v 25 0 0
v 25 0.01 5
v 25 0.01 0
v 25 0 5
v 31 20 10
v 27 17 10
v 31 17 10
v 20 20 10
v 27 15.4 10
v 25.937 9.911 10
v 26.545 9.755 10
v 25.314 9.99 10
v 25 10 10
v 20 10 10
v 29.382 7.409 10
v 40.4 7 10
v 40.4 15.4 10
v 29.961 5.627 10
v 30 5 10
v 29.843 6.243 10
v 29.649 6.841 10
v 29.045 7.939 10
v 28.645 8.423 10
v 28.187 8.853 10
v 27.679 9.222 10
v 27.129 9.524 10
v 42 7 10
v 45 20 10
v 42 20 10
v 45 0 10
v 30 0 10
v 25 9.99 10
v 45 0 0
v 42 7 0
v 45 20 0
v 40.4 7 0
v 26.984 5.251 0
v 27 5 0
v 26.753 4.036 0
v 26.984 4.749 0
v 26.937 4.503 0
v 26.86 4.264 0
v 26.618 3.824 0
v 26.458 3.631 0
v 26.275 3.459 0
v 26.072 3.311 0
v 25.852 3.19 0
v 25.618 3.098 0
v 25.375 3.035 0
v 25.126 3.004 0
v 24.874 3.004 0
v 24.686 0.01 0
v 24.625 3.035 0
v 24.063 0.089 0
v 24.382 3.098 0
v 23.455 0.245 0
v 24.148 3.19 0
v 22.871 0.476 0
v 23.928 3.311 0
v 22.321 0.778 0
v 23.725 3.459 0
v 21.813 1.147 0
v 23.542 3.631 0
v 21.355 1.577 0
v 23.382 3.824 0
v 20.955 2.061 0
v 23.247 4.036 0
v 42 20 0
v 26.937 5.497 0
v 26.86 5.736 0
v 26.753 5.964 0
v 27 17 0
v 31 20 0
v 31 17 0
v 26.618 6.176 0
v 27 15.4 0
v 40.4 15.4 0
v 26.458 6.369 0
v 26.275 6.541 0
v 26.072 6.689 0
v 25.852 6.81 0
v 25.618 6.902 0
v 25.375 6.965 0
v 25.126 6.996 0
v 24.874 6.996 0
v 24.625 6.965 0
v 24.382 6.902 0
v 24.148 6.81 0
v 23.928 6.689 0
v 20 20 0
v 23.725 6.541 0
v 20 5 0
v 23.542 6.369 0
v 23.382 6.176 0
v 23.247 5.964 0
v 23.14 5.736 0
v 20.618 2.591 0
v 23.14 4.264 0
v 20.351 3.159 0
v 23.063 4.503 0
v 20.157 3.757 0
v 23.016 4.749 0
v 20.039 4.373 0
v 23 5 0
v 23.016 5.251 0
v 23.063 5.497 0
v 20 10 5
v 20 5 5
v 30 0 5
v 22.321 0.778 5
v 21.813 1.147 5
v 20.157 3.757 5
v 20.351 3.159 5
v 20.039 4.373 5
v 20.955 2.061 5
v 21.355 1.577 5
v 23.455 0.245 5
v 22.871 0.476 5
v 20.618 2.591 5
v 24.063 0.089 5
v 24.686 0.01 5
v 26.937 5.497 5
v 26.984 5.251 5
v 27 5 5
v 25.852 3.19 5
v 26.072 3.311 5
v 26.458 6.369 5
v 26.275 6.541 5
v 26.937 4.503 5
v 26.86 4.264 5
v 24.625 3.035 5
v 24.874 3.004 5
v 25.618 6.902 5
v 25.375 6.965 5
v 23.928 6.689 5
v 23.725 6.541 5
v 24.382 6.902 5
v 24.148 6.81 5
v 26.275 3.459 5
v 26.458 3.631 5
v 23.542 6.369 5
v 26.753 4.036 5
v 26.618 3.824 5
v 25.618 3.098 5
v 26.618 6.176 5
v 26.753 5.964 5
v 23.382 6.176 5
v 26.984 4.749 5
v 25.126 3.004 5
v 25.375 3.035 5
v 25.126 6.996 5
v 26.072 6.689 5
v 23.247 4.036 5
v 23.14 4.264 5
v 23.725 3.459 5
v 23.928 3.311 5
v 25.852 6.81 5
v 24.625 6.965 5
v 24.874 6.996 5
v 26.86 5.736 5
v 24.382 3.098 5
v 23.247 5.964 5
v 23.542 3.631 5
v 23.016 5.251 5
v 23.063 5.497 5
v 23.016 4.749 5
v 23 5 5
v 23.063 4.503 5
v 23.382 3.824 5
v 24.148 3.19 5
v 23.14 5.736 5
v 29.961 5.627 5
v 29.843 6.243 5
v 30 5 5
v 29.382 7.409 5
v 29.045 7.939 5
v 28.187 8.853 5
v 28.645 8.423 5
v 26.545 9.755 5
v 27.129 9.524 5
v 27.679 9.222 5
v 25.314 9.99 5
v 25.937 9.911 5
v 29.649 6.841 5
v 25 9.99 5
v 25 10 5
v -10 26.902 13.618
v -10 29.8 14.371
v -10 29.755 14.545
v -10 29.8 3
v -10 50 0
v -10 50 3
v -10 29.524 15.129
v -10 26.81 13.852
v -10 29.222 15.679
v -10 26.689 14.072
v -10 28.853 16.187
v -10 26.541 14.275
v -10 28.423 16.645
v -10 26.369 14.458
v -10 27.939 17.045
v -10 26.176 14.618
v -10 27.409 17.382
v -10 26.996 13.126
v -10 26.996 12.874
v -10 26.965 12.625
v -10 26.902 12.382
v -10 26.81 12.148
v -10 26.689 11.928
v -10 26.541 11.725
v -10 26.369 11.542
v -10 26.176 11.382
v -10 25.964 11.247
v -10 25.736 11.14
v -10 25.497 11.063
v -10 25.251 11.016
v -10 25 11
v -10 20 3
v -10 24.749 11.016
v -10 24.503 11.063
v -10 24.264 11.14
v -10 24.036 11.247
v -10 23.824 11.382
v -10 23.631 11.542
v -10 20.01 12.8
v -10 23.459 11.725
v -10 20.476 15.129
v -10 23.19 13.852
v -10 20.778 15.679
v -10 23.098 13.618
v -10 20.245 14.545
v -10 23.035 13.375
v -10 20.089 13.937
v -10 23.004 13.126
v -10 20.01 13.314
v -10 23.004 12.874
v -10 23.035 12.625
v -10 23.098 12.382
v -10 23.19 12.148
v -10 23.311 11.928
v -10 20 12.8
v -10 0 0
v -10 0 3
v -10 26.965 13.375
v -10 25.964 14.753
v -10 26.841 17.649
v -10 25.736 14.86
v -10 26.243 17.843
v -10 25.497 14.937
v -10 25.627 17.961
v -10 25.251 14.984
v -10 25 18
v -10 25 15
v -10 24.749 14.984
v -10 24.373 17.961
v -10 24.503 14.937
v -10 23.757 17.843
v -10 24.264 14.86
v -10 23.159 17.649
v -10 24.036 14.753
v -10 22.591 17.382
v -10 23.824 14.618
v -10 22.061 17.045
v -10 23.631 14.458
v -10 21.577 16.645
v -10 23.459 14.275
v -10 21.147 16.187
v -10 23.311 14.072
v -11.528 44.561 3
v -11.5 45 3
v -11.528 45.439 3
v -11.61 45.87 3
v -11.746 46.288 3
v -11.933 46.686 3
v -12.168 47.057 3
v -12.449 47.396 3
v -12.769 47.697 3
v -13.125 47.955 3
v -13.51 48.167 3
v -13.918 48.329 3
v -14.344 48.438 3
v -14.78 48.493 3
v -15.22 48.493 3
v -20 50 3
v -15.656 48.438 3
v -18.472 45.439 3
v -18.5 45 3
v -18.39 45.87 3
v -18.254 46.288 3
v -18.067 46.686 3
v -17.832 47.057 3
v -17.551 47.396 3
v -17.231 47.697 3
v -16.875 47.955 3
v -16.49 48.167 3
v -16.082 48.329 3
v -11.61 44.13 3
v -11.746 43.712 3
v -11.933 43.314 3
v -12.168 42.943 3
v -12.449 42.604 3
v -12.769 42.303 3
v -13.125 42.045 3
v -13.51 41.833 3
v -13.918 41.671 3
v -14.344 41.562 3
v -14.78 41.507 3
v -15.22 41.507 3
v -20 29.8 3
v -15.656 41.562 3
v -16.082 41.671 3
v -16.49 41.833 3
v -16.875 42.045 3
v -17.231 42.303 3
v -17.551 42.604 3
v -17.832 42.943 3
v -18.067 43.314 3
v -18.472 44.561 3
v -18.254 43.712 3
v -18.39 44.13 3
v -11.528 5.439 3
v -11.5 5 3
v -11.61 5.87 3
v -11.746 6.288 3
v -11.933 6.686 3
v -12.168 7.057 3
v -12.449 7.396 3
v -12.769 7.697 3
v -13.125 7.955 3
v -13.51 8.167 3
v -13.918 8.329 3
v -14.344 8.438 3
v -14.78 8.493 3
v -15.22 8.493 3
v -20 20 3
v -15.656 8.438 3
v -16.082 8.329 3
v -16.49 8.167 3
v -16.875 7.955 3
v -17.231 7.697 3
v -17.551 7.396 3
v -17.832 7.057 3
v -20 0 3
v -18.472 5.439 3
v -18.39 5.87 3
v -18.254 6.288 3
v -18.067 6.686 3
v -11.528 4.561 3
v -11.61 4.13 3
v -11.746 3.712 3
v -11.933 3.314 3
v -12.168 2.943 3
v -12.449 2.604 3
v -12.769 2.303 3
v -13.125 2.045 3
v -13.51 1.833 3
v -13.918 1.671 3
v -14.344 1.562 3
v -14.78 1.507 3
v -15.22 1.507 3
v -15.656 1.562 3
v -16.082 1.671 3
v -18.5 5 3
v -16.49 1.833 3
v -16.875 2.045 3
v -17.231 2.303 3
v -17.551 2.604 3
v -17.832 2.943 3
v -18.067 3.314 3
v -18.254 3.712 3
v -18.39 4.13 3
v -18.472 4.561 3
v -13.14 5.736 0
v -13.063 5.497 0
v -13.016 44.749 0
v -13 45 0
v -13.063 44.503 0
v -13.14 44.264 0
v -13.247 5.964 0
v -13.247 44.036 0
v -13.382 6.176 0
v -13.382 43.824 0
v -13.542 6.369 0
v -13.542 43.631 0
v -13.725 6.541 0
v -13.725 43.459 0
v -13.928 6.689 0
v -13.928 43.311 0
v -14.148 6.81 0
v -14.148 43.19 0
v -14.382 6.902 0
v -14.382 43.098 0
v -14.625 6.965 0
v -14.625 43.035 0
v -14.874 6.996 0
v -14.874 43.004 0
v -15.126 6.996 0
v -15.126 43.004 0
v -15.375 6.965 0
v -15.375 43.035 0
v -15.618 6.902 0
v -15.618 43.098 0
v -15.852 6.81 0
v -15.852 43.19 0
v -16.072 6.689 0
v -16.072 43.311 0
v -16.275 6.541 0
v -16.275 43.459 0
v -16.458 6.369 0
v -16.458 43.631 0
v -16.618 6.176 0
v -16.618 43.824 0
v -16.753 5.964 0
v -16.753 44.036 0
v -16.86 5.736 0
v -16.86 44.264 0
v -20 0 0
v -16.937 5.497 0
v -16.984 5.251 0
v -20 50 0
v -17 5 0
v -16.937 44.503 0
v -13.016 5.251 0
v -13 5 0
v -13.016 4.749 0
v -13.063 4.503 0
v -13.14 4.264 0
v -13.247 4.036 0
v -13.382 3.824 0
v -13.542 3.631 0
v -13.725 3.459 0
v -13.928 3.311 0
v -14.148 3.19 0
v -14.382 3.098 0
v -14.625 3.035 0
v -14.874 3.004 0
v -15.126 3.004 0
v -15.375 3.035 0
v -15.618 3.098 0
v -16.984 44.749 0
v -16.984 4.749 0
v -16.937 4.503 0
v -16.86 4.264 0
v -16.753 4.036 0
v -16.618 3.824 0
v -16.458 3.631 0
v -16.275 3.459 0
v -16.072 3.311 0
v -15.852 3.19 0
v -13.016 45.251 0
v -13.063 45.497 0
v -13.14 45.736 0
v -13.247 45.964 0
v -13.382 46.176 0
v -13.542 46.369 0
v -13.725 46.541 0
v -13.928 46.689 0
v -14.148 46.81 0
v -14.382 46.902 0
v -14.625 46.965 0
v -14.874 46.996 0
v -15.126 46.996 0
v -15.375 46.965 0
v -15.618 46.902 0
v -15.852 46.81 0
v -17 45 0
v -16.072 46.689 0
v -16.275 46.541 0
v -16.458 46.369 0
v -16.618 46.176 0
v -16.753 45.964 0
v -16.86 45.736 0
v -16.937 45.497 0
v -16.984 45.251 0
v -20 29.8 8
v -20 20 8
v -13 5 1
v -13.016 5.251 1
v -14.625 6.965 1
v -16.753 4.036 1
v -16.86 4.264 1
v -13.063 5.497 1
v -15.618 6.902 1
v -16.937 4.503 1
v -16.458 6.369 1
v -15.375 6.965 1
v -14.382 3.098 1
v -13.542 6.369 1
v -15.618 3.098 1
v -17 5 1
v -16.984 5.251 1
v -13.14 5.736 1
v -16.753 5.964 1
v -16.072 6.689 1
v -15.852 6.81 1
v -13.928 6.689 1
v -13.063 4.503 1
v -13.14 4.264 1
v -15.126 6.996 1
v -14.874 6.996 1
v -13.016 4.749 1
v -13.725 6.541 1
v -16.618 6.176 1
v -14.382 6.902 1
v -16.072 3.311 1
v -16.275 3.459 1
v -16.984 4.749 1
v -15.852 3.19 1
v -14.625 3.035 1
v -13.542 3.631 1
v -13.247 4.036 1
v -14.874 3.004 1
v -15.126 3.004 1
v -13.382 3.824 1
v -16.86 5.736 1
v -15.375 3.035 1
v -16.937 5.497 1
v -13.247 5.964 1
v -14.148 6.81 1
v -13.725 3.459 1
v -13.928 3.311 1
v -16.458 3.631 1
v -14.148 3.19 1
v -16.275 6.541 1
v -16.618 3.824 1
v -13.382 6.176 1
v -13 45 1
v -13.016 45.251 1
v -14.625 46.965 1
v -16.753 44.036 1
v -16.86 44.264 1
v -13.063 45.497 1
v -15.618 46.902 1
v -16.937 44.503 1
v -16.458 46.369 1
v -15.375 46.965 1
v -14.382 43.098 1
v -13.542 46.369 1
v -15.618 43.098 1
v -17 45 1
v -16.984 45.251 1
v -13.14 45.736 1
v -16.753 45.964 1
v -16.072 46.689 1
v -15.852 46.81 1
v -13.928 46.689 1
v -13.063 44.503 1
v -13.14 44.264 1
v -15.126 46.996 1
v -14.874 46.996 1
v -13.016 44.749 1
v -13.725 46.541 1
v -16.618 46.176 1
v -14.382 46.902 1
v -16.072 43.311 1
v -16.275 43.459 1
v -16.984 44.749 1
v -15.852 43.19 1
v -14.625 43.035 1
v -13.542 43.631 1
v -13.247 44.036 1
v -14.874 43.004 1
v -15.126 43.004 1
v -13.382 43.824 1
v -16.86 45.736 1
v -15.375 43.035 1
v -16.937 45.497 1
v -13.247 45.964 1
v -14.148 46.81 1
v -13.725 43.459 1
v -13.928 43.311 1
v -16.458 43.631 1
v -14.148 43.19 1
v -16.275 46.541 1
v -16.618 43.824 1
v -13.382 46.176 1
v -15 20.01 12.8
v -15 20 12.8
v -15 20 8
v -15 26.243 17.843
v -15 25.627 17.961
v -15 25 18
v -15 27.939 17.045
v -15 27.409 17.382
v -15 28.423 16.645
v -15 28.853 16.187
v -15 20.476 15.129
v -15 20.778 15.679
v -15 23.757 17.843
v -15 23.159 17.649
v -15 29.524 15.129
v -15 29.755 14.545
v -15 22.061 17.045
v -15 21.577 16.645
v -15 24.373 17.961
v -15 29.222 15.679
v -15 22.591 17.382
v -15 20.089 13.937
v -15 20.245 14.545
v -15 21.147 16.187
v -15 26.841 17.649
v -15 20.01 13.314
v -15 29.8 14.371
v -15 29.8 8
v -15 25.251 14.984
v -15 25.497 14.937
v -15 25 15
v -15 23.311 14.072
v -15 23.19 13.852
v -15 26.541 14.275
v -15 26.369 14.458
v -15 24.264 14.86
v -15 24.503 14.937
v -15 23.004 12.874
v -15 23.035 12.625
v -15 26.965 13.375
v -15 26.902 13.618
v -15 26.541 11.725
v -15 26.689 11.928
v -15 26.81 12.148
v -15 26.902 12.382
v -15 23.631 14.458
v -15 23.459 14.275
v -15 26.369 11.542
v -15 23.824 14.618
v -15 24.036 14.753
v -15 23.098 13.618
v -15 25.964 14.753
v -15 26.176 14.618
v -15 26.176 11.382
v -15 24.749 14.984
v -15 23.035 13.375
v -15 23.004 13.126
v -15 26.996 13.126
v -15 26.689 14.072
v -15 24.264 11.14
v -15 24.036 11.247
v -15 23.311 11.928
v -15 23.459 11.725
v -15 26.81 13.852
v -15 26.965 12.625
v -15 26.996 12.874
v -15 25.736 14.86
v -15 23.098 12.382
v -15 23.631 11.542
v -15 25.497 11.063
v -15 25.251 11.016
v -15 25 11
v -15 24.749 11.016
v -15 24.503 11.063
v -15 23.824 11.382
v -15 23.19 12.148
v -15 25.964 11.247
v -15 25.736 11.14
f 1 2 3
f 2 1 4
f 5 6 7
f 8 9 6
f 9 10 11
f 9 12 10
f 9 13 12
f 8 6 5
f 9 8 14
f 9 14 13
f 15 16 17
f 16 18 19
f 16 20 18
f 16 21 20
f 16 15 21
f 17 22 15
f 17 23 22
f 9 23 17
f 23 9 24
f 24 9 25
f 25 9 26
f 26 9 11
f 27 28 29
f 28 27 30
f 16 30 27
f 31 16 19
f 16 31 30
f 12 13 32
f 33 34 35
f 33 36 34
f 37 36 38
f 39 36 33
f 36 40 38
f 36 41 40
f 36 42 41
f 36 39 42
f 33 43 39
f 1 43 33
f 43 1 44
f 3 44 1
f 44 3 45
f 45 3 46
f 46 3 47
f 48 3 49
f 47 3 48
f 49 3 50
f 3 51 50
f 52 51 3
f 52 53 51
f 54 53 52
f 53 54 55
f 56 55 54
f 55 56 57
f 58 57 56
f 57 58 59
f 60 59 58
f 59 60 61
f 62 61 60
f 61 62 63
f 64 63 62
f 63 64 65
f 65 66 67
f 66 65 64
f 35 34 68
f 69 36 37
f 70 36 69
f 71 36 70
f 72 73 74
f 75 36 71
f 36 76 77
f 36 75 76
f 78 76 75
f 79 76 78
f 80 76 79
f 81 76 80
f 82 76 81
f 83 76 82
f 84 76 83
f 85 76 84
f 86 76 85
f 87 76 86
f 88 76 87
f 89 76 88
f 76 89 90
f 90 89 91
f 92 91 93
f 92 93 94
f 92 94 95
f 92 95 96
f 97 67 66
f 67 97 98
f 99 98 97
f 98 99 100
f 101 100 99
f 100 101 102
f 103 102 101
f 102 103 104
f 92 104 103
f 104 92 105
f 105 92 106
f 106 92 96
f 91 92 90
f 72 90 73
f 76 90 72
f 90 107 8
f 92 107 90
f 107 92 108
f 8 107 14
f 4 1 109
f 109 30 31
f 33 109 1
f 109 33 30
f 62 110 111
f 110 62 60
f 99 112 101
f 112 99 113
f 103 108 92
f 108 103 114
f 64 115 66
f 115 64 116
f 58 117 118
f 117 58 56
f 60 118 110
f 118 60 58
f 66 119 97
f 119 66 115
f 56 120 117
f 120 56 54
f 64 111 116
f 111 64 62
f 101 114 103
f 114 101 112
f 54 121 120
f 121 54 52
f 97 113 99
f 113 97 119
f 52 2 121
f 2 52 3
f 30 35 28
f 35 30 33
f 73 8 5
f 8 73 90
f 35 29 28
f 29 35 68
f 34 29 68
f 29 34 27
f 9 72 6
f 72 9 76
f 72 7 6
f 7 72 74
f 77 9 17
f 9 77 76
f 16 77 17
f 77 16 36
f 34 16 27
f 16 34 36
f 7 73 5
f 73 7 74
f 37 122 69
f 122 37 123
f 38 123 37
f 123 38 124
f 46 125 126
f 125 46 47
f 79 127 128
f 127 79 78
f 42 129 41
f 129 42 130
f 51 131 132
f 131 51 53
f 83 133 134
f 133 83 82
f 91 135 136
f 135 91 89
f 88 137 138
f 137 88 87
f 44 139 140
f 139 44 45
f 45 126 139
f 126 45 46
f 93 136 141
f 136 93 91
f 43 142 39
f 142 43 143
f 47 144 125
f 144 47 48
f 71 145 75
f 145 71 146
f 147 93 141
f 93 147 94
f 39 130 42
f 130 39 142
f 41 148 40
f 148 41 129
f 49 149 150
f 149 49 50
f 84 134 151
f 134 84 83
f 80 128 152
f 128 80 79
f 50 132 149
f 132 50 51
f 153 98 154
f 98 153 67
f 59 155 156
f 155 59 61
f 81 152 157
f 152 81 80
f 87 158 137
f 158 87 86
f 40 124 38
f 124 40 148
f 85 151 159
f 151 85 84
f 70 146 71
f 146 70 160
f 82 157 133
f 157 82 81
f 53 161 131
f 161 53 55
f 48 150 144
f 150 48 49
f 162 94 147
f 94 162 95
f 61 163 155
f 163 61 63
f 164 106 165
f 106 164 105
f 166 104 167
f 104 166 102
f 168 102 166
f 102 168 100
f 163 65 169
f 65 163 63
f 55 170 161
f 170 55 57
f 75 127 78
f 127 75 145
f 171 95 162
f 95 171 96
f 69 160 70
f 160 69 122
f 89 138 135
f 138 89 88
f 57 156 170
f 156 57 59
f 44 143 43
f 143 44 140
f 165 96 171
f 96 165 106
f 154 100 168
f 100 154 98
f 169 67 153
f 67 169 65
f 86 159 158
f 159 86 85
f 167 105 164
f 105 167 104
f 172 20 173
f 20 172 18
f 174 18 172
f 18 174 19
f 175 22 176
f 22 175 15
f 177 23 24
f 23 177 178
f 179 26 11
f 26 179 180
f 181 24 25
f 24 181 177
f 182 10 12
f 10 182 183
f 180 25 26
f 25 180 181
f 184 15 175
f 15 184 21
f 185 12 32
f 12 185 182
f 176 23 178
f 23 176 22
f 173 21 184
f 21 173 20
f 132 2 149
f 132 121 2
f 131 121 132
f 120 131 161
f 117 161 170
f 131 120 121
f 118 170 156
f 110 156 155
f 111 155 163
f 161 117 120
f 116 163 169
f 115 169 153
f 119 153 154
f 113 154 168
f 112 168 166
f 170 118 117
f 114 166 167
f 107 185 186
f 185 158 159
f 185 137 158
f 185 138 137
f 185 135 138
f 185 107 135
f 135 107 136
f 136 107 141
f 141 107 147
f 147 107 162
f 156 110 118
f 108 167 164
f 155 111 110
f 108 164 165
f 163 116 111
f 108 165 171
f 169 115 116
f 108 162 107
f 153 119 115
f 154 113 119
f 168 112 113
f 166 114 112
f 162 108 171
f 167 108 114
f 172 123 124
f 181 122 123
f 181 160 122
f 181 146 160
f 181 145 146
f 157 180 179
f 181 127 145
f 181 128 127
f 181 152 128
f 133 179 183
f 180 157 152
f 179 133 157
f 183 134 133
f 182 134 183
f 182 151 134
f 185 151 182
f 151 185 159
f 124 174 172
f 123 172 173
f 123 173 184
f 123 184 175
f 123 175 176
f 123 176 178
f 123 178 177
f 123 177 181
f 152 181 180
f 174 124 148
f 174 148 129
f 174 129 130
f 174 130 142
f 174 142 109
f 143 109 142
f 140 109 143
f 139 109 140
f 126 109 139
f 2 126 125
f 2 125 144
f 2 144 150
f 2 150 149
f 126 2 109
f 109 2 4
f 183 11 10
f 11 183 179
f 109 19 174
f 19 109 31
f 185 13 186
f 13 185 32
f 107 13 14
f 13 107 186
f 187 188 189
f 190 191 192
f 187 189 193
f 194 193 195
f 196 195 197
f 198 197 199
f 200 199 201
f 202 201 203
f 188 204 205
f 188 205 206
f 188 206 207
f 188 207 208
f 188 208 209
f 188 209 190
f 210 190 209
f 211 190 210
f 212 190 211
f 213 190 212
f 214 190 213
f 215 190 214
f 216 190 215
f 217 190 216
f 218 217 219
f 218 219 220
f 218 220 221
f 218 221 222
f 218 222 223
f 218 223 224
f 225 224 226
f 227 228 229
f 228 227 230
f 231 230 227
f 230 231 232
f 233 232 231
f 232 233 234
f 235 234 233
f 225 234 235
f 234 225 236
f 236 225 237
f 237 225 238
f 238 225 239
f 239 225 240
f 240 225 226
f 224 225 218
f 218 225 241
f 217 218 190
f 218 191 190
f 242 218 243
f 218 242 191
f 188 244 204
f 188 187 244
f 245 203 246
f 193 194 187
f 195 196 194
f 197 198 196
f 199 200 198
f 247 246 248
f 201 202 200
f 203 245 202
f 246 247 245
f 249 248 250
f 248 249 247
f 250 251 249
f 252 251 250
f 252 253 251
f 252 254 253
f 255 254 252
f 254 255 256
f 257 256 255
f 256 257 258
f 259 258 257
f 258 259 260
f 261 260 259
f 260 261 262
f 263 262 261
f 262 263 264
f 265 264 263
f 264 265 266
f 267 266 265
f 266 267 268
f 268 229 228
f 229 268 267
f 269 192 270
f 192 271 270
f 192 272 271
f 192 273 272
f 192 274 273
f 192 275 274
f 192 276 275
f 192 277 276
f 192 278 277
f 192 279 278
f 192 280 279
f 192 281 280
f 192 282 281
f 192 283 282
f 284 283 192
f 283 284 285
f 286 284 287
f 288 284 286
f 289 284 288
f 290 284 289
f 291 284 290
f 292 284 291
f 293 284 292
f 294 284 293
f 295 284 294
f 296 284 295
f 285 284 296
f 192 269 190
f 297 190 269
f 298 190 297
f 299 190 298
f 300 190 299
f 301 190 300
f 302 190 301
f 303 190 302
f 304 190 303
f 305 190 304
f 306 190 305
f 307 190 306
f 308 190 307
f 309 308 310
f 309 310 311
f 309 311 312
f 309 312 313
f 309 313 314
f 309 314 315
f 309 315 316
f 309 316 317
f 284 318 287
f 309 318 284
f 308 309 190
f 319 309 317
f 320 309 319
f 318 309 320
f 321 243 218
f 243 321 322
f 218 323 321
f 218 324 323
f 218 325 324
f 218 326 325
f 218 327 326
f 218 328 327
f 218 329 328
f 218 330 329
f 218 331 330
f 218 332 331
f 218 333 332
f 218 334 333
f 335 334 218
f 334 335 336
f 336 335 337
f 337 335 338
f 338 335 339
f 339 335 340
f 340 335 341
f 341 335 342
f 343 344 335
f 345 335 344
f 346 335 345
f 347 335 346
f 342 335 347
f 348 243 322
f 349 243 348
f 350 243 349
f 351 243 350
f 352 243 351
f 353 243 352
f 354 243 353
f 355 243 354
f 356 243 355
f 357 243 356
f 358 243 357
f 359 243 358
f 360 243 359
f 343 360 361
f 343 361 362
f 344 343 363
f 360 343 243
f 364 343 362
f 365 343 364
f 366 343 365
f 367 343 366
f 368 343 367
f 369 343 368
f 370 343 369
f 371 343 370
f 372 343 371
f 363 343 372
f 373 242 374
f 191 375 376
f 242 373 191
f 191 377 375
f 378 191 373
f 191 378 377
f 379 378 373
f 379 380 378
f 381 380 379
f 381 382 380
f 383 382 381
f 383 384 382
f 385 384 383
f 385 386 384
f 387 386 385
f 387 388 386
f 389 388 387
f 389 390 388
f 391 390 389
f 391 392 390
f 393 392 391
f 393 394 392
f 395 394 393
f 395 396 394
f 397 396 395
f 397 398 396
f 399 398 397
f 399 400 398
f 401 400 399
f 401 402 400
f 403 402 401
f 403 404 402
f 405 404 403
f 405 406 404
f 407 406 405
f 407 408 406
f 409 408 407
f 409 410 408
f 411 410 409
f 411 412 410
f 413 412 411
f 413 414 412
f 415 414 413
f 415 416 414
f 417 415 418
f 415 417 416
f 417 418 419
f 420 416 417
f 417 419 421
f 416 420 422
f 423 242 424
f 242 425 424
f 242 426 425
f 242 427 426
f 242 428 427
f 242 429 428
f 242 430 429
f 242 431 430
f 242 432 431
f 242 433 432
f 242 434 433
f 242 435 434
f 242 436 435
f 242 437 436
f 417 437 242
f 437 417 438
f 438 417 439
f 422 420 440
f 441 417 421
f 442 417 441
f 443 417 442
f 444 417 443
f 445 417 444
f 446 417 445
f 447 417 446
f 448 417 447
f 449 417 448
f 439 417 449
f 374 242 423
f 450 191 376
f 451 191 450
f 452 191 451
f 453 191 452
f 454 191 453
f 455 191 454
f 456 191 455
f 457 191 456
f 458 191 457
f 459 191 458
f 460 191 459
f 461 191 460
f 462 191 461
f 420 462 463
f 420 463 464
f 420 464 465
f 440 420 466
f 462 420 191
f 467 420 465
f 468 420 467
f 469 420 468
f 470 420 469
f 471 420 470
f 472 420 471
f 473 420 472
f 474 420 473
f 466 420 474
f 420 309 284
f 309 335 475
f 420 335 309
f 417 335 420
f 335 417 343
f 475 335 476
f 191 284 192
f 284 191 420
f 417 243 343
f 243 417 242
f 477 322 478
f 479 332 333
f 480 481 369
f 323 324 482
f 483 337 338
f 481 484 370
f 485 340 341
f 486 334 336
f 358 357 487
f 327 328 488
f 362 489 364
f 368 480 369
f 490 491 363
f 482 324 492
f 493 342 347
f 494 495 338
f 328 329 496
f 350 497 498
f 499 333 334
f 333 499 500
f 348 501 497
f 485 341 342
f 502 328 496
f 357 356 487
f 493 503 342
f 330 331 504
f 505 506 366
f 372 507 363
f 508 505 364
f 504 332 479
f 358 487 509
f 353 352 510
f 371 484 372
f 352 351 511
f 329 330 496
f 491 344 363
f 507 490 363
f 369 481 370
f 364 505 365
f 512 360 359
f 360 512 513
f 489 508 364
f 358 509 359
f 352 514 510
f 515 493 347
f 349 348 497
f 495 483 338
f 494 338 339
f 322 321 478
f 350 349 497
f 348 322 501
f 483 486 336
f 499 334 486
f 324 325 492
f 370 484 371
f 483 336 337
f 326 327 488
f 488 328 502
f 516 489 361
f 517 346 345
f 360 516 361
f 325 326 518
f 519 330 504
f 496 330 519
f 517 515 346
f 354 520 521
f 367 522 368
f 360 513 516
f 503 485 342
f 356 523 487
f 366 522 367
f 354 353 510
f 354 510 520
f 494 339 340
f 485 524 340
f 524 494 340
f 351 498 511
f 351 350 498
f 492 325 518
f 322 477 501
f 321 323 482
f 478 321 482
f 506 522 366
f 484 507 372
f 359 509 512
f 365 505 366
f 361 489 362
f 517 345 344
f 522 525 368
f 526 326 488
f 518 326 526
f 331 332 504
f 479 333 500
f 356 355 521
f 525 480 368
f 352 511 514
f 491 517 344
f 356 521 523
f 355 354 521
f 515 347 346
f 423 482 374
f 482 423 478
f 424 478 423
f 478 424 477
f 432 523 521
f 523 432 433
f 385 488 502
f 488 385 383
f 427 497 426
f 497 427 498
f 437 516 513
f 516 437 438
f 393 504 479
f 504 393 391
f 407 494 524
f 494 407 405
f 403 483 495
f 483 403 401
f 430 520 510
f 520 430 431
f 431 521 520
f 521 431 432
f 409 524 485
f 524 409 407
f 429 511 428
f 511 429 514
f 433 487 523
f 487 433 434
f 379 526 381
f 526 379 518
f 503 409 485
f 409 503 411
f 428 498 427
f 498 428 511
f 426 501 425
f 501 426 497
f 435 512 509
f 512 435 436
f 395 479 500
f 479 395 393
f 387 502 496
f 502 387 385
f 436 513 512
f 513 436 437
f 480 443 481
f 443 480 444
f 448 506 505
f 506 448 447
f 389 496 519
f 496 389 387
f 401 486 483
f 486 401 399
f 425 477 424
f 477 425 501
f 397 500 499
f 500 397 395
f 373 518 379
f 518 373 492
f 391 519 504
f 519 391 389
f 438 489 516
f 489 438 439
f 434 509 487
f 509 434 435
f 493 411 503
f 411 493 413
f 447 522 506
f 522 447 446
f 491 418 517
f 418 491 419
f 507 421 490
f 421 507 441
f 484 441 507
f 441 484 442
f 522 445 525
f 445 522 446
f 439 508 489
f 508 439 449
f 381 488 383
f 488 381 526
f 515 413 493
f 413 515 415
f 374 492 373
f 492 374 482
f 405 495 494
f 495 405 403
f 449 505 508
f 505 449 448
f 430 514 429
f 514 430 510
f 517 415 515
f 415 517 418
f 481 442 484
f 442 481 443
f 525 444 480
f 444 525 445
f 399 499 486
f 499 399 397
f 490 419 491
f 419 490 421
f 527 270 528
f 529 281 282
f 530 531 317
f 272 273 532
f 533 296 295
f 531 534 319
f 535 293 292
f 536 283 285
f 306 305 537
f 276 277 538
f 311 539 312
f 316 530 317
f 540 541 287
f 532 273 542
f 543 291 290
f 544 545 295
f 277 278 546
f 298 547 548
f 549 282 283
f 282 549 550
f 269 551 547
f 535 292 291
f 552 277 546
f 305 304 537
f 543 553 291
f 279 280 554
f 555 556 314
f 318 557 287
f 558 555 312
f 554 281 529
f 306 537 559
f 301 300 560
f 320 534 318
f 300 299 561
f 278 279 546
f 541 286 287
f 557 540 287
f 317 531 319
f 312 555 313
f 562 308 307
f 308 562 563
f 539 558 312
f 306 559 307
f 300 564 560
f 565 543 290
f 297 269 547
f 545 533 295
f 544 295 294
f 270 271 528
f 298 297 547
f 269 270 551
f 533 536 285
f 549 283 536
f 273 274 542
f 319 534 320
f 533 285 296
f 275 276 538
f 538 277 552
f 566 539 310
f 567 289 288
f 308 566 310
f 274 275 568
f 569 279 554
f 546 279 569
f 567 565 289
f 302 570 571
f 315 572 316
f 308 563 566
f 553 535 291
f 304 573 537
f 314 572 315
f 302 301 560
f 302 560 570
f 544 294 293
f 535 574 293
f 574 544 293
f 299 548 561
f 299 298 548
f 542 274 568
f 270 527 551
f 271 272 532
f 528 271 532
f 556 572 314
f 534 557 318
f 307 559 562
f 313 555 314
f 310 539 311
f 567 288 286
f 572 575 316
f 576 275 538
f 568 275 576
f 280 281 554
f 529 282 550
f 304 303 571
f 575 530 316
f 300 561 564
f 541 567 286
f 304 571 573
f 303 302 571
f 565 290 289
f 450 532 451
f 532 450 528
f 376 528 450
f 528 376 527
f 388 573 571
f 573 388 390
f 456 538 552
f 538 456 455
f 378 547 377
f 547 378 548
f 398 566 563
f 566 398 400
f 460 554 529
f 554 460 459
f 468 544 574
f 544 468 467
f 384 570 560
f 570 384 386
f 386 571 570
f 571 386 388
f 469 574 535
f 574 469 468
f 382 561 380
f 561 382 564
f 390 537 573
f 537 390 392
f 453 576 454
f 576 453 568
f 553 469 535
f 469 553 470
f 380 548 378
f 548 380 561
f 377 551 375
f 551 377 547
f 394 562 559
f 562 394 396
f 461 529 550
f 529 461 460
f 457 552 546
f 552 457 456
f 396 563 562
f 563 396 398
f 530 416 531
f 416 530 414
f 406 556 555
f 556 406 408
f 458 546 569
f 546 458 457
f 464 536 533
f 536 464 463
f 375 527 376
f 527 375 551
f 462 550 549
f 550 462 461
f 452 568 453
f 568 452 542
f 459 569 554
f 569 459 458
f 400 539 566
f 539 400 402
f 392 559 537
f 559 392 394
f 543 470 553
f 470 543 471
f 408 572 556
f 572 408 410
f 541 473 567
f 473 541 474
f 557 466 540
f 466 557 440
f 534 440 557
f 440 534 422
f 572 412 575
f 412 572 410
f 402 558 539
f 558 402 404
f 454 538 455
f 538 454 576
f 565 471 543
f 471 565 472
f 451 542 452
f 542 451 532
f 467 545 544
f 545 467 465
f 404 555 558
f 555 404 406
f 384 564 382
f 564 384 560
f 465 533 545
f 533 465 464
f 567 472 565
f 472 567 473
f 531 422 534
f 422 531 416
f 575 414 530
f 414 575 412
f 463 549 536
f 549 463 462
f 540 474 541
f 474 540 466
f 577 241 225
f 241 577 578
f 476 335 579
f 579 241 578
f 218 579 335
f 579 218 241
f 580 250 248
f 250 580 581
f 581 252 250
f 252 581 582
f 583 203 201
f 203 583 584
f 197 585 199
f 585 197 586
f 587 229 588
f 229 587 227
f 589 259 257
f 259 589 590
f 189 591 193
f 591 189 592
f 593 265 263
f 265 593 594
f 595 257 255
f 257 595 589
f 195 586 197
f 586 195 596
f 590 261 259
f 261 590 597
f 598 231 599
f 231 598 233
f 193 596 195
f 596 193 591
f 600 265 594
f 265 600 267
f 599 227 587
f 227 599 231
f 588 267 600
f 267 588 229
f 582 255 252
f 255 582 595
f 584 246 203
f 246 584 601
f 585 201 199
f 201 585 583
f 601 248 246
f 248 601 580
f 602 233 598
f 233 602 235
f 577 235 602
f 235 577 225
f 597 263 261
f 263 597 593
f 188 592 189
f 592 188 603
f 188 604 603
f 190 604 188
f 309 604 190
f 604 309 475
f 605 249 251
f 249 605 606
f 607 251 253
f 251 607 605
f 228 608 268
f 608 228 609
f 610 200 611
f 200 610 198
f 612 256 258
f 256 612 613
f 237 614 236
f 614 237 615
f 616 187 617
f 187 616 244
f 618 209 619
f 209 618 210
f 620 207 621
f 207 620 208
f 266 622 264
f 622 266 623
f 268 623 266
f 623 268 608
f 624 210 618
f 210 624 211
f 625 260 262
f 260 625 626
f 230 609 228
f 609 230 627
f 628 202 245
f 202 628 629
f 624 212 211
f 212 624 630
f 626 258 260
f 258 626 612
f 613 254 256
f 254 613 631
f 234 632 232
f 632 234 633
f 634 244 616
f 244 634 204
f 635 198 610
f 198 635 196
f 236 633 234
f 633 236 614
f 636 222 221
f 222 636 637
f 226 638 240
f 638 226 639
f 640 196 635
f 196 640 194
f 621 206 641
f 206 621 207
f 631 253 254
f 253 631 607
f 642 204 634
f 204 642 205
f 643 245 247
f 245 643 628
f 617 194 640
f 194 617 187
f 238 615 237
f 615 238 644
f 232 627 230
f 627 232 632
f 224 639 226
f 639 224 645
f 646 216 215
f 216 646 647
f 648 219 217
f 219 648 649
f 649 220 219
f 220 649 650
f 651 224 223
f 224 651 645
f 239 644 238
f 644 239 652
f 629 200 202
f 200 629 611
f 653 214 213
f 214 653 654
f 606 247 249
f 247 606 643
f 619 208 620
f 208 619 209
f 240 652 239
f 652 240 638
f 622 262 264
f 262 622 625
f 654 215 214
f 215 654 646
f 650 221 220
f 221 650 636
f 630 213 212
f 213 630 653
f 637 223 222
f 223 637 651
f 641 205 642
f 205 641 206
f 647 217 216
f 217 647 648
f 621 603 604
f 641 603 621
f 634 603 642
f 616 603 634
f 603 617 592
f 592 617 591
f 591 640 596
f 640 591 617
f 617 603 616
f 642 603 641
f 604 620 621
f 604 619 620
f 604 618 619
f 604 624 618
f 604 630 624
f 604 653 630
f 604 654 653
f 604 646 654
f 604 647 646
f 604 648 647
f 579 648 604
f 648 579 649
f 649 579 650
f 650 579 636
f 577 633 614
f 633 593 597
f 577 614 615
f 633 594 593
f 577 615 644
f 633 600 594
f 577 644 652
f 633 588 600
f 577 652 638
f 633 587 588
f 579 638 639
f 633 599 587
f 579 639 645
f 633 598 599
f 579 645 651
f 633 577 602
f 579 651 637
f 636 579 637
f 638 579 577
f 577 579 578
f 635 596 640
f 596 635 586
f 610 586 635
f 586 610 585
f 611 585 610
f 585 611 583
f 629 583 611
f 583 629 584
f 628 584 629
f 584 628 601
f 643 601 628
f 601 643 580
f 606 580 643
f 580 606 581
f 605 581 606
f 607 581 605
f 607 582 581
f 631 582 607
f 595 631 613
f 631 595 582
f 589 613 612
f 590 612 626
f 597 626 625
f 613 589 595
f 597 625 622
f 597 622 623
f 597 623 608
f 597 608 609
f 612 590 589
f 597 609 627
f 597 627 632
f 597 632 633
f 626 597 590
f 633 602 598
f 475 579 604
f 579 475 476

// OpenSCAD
base_width=10;
base_height=50;
base_thickness=3;
base_arm_lenght=15;

hole_diameter=4;
hole_border=3;

holder_width=25;
holder_height=20;
holder_thickness=10;

profile_width=15;
profile_height=10;
profile_thickness=1.6;
profile_border=3;

strip_space_width=11;

screw_hole_diameter=7;
screw_hole_depth=2;

spacing=0.2;
$fn=50;

Assembly();

module Assembly(){
    translate ([20,0,0]) holder();
    translate ([-20,0,0])base();
    };

module holder(){
    difference(){
        cube([holder_width,holder_height,holder_thickness],center = false);
        difference(){
            cube([hole_border+hole_diameter/2,hole_border+hole_diameter/2,holder_thickness], center=false);
            translate([hole_diameter/2+hole_border,hole_diameter/2+hole_border,0])cylinder(r=hole_diameter/2+hole_border,h=holder_thickness,center = false);
        }
        translate([holder_width-profile_width-profile_border,holder_height-profile_thickness-profile_border,0,]) cube([profile_width,profile_thickness,holder_thickness],center = false);
        translate([holder_width-profile_thickness-profile_border,holder_height-profile_height-profile_border,0,]) cube([profile_thickness,profile_height,holder_thickness],center = false);
            translate([holder_width-strip_space_width-profile_border,holder_height-profile_border,0,]) cube([strip_space_width,profile_border,holder_thickness],center = false); 
        translate([hole_border+(hole_diameter/2),hole_border+(hole_diameter/2),0,]) cylinder(r=hole_diameter/2,h=holder_thickness,center = false);
        translate([hole_diameter/2+hole_border,hole_diameter/2+hole_border,holder_thickness/2])cylinder(r=hole_diameter/2+hole_border,h=holder_thickness/2,center = false);        
        translate([hole_diameter/2+hole_border,0,holder_thickness/2])cube ([hole_diameter/2+hole_border,hole_diameter/2+hole_border,holder_thickness/2],center = false); 
        translate([0,hole_diameter/2+hole_border,holder_thickness/2])cube ([hole_diameter/2+hole_border,hole_diameter/2+hole_border,holder_thickness/2],center = false); 
        }
               

    };
module base(){
    union(){
/*Base*/    
        difference(){
        cube([base_width,base_height,base_thickness],center = false);
/*Hole1*/
        translate([hole_diameter/2+hole_border,hole_diameter/2+hole_border,base_thickness-screw_hole_depth])cylinder(r2=screw_hole_diameter/2,r1=hole_diameter/2,h=screw_hole_depth,center = false);
        translate([hole_diameter/2+hole_border,hole_diameter/2+hole_border,0])cylinder(r=hole_diameter/2,h=base_width/2,center = false); 
/*Hole1*/
        translate([hole_diameter/2+hole_border,base_height-(hole_diameter/2+hole_border),base_thickness-screw_hole_depth])cylinder(r2=screw_hole_diameter/2,r1=hole_diameter/2,h=screw_hole_depth,center = false);
        translate([hole_diameter/2+hole_border,base_height-(hole_diameter/2+hole_border),0])cylinder(r=hole_diameter/2,h=base_width/2,center = false); 
        }
/*Arm*/            
        translate([base_width,base_height/2-(base_width/2),base_thickness]) rotate([0,-90,0]){ 
          difference(){
                cube([base_arm_lenght,base_width-spacing,hole_diameter+2*hole_border]);
              translate([base_arm_lenght-(2*hole_border+hole_diameter),0,0]) difference(){
            translate([hole_border+hole_diameter/2-spacing,0,0]) cube([hole_border+(hole_diameter/2)+2*spacing,2*hole_border+hole_diameter,base_width], center=false);
            translate([base_arm_lenght-(2*hole_border+hole_diameter),hole_diameter/2+hole_border,0])cylinder(r=hole_diameter/2+hole_border,h=holder_thickness,center = false);
        }
                translate([base_arm_lenght-(hole_border+(hole_diameter/2)),hole_border+(hole_diameter/2),0,]) cylinder(r=hole_diameter/2,h=holder_thickness,center = false);
              translate([base_arm_lenght-(hole_diameter+2*hole_border),0,holder_thickness/2])cube ([hole_diameter+2*hole_border,hole_diameter+2*hole_border,holder_thickness/2],center = false);
        
                };
            
        };
        };
    };

